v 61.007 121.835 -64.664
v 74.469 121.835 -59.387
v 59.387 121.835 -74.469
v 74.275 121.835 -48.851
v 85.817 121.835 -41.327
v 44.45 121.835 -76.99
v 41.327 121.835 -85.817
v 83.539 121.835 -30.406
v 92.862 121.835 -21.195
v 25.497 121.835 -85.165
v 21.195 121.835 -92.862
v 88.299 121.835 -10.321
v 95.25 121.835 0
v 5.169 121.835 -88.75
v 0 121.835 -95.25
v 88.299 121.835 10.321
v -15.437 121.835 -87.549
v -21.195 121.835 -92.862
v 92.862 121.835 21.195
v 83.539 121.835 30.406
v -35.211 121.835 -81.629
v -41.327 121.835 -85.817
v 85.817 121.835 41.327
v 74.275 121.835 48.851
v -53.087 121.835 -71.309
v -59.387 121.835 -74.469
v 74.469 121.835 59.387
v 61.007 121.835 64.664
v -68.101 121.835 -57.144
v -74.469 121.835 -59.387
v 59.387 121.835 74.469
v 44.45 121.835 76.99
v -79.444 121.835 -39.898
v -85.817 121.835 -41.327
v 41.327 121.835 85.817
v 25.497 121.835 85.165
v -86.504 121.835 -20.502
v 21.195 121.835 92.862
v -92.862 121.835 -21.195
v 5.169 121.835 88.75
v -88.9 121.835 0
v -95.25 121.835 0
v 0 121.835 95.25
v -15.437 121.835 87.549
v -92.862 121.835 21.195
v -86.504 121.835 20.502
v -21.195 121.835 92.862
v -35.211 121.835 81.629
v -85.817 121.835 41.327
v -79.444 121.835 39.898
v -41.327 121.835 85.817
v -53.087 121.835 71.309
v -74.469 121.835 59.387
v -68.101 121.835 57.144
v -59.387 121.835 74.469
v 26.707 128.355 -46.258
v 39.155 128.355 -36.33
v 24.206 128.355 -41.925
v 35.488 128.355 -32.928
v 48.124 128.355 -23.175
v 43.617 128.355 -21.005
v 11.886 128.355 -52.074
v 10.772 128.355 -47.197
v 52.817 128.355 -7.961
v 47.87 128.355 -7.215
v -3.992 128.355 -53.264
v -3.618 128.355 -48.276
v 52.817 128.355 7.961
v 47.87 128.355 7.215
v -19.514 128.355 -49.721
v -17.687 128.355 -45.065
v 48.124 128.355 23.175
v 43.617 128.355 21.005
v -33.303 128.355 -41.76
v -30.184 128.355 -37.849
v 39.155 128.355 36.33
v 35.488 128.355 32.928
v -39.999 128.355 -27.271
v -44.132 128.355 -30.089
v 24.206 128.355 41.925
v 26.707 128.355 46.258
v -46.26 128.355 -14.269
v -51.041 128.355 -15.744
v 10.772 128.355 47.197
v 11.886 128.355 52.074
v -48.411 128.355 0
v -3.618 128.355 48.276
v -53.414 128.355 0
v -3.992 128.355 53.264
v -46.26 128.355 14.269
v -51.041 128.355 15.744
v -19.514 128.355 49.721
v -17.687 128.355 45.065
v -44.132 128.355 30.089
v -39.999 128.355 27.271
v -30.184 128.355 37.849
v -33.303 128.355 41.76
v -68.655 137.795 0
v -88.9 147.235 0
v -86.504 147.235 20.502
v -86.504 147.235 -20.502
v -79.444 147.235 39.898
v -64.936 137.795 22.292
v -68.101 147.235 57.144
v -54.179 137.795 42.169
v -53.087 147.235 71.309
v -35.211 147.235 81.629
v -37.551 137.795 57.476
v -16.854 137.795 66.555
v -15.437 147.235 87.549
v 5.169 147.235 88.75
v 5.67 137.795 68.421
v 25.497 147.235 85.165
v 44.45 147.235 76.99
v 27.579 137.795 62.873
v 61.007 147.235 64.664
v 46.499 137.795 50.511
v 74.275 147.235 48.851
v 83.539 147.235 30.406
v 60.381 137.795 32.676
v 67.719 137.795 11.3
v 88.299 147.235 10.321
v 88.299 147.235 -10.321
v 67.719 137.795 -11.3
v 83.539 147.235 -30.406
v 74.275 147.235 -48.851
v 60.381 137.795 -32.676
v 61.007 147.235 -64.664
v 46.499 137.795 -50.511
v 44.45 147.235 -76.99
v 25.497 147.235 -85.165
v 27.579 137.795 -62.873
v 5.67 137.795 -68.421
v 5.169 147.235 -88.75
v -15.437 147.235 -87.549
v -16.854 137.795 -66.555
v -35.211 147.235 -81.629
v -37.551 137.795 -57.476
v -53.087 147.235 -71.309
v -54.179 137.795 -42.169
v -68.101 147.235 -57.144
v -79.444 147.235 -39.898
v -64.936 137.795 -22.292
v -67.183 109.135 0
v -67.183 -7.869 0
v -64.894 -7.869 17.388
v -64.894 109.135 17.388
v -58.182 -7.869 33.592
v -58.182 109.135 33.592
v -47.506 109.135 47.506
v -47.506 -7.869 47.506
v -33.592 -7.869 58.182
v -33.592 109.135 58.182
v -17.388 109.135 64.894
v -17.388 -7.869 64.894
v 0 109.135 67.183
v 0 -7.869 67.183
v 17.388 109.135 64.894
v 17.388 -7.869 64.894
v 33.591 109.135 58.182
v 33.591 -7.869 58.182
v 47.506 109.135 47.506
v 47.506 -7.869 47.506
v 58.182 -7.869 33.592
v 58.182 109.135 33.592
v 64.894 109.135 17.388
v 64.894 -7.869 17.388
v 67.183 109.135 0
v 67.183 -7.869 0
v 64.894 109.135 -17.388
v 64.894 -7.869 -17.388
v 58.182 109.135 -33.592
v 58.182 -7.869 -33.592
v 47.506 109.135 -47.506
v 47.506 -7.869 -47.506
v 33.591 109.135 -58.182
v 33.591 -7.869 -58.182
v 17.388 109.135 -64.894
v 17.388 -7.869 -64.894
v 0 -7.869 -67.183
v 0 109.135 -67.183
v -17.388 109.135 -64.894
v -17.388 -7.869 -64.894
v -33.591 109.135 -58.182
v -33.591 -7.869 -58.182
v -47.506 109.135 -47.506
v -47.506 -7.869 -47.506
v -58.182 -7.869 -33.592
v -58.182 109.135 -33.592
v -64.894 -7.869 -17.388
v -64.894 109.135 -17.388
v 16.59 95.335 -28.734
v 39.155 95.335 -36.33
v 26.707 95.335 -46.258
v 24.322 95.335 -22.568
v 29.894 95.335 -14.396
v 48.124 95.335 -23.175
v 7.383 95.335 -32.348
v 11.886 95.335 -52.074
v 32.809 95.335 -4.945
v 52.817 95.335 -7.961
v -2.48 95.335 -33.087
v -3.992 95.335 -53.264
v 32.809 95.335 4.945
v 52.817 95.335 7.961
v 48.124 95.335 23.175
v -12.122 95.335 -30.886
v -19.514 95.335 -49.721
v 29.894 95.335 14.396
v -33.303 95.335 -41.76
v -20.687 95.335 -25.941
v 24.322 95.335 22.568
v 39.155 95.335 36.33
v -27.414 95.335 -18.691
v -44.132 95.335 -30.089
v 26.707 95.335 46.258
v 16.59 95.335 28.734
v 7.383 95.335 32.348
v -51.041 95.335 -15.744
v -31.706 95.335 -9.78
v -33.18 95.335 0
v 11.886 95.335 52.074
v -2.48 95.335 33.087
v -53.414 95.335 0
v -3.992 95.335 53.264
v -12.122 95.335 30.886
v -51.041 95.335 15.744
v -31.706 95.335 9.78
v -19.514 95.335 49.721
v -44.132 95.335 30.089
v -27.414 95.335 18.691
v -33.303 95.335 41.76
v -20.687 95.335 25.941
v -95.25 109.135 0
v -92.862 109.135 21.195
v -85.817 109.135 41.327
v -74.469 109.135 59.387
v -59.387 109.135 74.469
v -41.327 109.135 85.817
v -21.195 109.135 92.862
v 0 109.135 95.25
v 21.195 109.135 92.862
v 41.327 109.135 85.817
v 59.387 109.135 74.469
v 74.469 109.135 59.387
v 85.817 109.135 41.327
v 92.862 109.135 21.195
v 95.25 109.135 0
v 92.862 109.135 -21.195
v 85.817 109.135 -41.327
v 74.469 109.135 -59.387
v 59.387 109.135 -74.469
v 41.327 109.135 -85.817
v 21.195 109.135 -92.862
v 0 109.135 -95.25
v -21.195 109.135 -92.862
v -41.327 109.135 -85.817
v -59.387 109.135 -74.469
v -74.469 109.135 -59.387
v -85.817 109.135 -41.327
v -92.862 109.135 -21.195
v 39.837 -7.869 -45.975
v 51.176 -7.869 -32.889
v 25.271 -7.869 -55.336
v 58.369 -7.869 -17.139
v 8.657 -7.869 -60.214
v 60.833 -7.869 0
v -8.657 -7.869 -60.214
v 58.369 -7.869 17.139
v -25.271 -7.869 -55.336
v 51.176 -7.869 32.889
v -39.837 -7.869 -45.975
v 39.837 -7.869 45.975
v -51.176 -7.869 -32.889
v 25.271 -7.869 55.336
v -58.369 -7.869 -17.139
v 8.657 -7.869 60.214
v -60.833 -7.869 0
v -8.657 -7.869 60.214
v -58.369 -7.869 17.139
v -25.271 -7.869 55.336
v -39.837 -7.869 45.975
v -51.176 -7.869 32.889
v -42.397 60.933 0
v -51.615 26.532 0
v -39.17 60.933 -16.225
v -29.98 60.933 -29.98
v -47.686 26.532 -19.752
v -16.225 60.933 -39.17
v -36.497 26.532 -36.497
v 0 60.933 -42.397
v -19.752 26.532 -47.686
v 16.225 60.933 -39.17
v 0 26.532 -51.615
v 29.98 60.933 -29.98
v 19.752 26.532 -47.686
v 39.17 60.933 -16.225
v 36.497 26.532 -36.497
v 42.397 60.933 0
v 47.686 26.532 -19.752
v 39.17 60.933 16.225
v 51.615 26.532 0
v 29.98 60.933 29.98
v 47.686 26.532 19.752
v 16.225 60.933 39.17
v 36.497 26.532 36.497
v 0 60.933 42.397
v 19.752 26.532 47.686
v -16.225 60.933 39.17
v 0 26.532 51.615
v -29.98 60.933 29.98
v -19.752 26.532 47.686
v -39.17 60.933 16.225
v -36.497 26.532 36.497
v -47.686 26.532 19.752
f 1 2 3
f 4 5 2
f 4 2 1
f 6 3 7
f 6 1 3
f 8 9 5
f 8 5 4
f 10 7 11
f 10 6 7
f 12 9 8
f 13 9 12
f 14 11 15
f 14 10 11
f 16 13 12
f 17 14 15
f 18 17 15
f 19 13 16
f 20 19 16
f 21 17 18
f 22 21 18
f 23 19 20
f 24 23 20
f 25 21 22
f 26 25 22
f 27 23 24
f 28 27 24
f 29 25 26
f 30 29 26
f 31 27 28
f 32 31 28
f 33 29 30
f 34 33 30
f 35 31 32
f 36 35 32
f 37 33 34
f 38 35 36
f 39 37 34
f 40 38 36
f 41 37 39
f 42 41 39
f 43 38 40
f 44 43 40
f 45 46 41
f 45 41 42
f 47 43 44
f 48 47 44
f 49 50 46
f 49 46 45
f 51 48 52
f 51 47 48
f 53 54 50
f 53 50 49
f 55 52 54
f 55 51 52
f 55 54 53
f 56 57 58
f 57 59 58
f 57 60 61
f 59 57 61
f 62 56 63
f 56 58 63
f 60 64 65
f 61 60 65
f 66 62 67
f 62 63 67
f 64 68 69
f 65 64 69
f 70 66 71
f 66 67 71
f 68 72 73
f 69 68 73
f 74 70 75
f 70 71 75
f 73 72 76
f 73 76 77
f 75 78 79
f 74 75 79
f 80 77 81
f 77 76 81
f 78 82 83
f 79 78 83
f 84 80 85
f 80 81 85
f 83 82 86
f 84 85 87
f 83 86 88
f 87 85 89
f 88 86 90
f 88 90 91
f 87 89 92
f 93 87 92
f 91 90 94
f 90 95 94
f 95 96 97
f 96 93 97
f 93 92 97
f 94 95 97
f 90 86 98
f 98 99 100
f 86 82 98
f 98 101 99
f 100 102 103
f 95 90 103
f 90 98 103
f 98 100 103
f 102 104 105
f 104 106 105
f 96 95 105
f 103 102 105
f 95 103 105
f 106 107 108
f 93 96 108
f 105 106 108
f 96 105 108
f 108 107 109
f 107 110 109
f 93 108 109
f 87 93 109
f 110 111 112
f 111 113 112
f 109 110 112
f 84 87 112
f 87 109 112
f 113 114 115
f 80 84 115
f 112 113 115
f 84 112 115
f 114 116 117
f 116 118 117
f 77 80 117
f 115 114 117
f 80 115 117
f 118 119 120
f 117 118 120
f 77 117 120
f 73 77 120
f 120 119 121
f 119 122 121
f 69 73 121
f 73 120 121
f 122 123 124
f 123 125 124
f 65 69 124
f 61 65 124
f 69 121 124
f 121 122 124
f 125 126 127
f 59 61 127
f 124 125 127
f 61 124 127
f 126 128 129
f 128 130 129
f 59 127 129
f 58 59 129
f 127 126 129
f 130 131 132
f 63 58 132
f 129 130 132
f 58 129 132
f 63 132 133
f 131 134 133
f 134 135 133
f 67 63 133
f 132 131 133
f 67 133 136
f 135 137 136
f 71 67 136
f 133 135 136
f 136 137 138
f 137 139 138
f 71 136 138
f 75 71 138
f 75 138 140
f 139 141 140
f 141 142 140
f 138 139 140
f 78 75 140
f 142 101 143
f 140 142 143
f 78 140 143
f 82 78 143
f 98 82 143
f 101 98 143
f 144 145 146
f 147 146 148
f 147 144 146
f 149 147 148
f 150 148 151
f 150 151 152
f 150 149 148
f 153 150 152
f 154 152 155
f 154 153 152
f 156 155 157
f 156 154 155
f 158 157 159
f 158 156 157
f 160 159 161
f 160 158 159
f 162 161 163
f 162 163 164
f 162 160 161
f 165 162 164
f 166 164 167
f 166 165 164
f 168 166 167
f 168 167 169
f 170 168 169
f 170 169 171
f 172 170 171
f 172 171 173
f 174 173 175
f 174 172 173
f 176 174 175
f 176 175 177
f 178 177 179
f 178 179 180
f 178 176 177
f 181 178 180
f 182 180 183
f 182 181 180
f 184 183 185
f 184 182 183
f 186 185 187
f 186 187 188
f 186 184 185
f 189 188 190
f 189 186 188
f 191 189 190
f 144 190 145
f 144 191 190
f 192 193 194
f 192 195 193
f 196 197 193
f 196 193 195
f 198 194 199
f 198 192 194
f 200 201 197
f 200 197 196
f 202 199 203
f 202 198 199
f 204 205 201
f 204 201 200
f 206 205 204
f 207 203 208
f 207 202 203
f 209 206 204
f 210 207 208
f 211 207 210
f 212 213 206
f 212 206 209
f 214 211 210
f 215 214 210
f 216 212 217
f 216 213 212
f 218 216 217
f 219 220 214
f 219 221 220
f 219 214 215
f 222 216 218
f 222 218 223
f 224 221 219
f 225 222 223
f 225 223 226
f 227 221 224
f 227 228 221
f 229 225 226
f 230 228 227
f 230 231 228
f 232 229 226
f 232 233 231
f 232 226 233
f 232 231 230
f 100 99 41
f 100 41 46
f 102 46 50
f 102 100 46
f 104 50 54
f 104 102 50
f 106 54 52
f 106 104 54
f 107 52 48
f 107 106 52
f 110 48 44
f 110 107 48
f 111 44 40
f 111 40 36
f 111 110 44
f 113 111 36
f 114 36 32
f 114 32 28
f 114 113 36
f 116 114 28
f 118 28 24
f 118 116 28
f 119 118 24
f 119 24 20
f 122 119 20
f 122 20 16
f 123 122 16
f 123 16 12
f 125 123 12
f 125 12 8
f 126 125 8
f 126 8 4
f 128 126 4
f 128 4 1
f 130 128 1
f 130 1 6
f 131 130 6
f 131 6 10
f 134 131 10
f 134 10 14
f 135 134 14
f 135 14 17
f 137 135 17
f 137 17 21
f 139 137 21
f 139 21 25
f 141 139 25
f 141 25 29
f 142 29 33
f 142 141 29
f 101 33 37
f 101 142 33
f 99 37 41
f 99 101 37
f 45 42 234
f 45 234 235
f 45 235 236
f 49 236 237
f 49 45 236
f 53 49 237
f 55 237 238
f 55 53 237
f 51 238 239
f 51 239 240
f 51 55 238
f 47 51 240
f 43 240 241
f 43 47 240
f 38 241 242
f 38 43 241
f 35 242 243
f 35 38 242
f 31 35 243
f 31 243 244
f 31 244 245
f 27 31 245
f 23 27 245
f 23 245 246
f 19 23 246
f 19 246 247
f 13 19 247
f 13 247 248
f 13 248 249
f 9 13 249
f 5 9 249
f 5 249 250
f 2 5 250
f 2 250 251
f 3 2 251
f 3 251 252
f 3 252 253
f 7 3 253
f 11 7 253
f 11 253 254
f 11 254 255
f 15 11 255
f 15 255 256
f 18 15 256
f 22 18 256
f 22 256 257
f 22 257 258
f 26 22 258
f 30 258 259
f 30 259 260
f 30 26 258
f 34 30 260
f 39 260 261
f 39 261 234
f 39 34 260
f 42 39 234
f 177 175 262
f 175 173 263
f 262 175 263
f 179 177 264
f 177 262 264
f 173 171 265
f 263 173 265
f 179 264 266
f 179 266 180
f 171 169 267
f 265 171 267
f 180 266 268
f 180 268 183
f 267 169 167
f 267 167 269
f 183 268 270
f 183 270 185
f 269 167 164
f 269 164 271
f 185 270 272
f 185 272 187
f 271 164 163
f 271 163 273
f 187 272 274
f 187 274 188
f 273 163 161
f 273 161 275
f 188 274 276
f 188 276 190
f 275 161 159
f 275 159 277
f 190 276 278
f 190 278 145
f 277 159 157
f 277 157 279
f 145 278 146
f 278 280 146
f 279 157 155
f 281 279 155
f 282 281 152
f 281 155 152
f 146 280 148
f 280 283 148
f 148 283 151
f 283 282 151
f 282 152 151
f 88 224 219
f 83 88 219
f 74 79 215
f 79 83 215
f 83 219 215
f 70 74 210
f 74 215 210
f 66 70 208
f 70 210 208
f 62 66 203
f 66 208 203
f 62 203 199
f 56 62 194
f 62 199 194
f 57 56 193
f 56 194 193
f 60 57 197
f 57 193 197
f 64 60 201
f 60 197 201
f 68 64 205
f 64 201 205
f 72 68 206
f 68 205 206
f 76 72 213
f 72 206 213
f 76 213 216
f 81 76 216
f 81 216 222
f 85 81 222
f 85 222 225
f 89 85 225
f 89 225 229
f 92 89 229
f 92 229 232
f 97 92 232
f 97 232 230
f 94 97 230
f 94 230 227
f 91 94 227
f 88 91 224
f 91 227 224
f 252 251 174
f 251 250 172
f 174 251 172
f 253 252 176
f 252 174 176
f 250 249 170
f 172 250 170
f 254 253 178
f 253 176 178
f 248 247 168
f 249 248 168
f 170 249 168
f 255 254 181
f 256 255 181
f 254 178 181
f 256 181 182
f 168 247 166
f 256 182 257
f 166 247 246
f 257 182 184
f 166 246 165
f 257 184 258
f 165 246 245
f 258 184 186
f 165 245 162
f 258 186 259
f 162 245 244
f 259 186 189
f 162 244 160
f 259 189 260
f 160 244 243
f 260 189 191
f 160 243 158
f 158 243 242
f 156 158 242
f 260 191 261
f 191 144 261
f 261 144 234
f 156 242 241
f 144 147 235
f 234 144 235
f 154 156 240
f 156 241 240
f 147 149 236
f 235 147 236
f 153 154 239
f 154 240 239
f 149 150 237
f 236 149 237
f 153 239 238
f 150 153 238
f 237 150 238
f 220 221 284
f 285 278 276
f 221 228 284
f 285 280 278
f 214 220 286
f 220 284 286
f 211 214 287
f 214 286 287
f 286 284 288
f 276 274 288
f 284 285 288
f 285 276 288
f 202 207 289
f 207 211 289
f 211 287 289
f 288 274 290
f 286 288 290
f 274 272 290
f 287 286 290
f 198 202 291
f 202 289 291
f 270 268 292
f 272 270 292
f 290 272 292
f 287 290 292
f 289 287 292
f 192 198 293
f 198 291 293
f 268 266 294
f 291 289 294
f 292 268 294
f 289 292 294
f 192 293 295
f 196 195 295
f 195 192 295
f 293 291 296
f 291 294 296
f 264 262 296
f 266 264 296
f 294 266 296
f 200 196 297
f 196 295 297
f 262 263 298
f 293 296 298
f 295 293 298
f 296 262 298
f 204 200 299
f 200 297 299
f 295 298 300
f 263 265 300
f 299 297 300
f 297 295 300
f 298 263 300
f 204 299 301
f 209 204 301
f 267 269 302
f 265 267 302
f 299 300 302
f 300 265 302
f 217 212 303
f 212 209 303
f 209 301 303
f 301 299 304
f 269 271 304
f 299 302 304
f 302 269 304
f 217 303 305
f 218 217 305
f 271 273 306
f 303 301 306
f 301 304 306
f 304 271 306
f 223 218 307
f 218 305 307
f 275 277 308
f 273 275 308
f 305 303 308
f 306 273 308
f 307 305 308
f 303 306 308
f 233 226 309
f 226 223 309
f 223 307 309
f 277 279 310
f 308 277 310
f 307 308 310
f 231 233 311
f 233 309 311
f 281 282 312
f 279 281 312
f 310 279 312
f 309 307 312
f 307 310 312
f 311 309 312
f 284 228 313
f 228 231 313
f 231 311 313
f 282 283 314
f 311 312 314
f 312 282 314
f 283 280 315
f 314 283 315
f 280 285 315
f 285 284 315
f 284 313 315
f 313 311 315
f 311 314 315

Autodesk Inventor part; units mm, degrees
ref_plane "YZ Plane" through (0, 0, 0) normal (1, 0, 0) x (0, 1, 0)
ref_plane "XZ Plane" through (0, 0, 0) normal (0, 1, 0) x (-1, 0, 0)
ref_plane "XY Plane" through (0, 0, 0) normal (0, 0, 1) x (1, 0, 0)
sketch "Sketch1" plane through (0, 0, 0) normal (0, 0, 1) x (1, 0, 0)
  line L0 (-67.183, -7.8688) -> (-67.183, 109.1349)
  line L1 (-67.183, -7.8688) -> (-60.833, -7.8688)
  line L2 (-67.183, 109.1349) -> (-95.25, 109.1349)
  line L3 (-95.25, 109.1349) -> (-95.25, 121.8349)
  line L4 (-95.25, 121.8349) -> (-88.9, 121.8349)
  line L5 (-88.9, 121.8349) -> (-88.9, 147.2349)
  line L6 (-88.9, 147.2349) -> (-38.3236, 147.2349) construction
  line L7 (-60.833, -7.8688) -> (-33.1797, 95.3346)
  line L8 (-33.1797, 95.3346) -> (-53.4136, 95.3346)
  line L9 (0, -38.8896) -> (0, 178.2557) projected
  line L10 (-88.9, 147.2349) -> (-48.411, 128.3546)
  line L11 (-48.411, 128.3546) -> (-53.4136, 128.3546)
  line L12 (-53.4136, 128.3546) -> (-53.4136, 95.3346)
  point P0 (0, 0)
  dimension "d0" = 6.35
  dimension "d1" = 60.833
  dimension "d4" = 12.7
  dimension "d5" = 28.067
  dimension "d6" = 25.4
  dimension "d9" = 6.35
  dimension "d10" = 105
  dimension "d16" = 20.2339
  dimension "d17" = 25
  dimension "d18" = 5.0026
  dimension "d19" = 33.02
  dimension "d20" = 33.1797
  dimension "d21" = 95.25
  dimension "d22" = 117.0038
revolve "Revolution1" add sketch "Sketch1" angle 360 about axis through (0, -10, 0) along (0, 1, 0)
properties part number "Phenlic"
